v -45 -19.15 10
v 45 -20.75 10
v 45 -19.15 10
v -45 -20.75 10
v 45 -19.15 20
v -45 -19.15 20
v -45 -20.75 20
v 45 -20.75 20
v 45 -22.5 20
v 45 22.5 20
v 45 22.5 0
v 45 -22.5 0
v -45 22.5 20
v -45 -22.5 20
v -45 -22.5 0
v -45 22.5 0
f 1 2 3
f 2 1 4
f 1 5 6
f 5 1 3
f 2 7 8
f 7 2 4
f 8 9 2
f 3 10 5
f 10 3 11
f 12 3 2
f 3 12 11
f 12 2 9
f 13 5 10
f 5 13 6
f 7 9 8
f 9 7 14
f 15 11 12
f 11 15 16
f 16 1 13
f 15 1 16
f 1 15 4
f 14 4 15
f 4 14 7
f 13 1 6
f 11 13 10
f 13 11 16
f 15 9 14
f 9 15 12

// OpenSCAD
// Slide drying rack for microscope slides (75 x 25 x 1 mm)
// Print orientation: base on XY plane, slots open at top (+Z)

// ---------- Block ----------
block_len   = 90;    // block length along X (mm)
block_wid   = 45;    // block width along Y (mm)
block_ht    = 20;    // block height along Z (mm)

// ---------- Slots ----------
slot_count  = 10;    // number of slide slots
slot_len    = 77;    // slot length along X (mm)
slot_wid    = 1.6;   // slot width along Y (mm)
slot_depth  = 10;    // slot depth from top face (mm)
slot_pitch  = 3.5;   // centre-to-centre spacing in Y (mm)

// ---------- Misc ----------
eps         = 0.5;   // overshoot for clean cuts (mm)
$fn         = 64;    // curve resolution

// Derived
slot_x0 = -(slot_count - 1) * slot_pitch / 2;  // first slot centre X (keeps group centred)

difference() {
    // Solid base block
    translate([-block_len / 2, -block_wid / 2, 0])
        cube([block_len, block_wid, block_ht]);

    // Parallel slots, open at top
    for (i = [0 : slot_count - 1]) {
        translate([slot_x0 + i * slot_pitch - slot_len / 2,
                   -block_wid / 2 + slot_pitch / 2,
                   block_ht - slot_depth])
            cube([slot_len, slot_wid, slot_depth + eps]);
    }
}
